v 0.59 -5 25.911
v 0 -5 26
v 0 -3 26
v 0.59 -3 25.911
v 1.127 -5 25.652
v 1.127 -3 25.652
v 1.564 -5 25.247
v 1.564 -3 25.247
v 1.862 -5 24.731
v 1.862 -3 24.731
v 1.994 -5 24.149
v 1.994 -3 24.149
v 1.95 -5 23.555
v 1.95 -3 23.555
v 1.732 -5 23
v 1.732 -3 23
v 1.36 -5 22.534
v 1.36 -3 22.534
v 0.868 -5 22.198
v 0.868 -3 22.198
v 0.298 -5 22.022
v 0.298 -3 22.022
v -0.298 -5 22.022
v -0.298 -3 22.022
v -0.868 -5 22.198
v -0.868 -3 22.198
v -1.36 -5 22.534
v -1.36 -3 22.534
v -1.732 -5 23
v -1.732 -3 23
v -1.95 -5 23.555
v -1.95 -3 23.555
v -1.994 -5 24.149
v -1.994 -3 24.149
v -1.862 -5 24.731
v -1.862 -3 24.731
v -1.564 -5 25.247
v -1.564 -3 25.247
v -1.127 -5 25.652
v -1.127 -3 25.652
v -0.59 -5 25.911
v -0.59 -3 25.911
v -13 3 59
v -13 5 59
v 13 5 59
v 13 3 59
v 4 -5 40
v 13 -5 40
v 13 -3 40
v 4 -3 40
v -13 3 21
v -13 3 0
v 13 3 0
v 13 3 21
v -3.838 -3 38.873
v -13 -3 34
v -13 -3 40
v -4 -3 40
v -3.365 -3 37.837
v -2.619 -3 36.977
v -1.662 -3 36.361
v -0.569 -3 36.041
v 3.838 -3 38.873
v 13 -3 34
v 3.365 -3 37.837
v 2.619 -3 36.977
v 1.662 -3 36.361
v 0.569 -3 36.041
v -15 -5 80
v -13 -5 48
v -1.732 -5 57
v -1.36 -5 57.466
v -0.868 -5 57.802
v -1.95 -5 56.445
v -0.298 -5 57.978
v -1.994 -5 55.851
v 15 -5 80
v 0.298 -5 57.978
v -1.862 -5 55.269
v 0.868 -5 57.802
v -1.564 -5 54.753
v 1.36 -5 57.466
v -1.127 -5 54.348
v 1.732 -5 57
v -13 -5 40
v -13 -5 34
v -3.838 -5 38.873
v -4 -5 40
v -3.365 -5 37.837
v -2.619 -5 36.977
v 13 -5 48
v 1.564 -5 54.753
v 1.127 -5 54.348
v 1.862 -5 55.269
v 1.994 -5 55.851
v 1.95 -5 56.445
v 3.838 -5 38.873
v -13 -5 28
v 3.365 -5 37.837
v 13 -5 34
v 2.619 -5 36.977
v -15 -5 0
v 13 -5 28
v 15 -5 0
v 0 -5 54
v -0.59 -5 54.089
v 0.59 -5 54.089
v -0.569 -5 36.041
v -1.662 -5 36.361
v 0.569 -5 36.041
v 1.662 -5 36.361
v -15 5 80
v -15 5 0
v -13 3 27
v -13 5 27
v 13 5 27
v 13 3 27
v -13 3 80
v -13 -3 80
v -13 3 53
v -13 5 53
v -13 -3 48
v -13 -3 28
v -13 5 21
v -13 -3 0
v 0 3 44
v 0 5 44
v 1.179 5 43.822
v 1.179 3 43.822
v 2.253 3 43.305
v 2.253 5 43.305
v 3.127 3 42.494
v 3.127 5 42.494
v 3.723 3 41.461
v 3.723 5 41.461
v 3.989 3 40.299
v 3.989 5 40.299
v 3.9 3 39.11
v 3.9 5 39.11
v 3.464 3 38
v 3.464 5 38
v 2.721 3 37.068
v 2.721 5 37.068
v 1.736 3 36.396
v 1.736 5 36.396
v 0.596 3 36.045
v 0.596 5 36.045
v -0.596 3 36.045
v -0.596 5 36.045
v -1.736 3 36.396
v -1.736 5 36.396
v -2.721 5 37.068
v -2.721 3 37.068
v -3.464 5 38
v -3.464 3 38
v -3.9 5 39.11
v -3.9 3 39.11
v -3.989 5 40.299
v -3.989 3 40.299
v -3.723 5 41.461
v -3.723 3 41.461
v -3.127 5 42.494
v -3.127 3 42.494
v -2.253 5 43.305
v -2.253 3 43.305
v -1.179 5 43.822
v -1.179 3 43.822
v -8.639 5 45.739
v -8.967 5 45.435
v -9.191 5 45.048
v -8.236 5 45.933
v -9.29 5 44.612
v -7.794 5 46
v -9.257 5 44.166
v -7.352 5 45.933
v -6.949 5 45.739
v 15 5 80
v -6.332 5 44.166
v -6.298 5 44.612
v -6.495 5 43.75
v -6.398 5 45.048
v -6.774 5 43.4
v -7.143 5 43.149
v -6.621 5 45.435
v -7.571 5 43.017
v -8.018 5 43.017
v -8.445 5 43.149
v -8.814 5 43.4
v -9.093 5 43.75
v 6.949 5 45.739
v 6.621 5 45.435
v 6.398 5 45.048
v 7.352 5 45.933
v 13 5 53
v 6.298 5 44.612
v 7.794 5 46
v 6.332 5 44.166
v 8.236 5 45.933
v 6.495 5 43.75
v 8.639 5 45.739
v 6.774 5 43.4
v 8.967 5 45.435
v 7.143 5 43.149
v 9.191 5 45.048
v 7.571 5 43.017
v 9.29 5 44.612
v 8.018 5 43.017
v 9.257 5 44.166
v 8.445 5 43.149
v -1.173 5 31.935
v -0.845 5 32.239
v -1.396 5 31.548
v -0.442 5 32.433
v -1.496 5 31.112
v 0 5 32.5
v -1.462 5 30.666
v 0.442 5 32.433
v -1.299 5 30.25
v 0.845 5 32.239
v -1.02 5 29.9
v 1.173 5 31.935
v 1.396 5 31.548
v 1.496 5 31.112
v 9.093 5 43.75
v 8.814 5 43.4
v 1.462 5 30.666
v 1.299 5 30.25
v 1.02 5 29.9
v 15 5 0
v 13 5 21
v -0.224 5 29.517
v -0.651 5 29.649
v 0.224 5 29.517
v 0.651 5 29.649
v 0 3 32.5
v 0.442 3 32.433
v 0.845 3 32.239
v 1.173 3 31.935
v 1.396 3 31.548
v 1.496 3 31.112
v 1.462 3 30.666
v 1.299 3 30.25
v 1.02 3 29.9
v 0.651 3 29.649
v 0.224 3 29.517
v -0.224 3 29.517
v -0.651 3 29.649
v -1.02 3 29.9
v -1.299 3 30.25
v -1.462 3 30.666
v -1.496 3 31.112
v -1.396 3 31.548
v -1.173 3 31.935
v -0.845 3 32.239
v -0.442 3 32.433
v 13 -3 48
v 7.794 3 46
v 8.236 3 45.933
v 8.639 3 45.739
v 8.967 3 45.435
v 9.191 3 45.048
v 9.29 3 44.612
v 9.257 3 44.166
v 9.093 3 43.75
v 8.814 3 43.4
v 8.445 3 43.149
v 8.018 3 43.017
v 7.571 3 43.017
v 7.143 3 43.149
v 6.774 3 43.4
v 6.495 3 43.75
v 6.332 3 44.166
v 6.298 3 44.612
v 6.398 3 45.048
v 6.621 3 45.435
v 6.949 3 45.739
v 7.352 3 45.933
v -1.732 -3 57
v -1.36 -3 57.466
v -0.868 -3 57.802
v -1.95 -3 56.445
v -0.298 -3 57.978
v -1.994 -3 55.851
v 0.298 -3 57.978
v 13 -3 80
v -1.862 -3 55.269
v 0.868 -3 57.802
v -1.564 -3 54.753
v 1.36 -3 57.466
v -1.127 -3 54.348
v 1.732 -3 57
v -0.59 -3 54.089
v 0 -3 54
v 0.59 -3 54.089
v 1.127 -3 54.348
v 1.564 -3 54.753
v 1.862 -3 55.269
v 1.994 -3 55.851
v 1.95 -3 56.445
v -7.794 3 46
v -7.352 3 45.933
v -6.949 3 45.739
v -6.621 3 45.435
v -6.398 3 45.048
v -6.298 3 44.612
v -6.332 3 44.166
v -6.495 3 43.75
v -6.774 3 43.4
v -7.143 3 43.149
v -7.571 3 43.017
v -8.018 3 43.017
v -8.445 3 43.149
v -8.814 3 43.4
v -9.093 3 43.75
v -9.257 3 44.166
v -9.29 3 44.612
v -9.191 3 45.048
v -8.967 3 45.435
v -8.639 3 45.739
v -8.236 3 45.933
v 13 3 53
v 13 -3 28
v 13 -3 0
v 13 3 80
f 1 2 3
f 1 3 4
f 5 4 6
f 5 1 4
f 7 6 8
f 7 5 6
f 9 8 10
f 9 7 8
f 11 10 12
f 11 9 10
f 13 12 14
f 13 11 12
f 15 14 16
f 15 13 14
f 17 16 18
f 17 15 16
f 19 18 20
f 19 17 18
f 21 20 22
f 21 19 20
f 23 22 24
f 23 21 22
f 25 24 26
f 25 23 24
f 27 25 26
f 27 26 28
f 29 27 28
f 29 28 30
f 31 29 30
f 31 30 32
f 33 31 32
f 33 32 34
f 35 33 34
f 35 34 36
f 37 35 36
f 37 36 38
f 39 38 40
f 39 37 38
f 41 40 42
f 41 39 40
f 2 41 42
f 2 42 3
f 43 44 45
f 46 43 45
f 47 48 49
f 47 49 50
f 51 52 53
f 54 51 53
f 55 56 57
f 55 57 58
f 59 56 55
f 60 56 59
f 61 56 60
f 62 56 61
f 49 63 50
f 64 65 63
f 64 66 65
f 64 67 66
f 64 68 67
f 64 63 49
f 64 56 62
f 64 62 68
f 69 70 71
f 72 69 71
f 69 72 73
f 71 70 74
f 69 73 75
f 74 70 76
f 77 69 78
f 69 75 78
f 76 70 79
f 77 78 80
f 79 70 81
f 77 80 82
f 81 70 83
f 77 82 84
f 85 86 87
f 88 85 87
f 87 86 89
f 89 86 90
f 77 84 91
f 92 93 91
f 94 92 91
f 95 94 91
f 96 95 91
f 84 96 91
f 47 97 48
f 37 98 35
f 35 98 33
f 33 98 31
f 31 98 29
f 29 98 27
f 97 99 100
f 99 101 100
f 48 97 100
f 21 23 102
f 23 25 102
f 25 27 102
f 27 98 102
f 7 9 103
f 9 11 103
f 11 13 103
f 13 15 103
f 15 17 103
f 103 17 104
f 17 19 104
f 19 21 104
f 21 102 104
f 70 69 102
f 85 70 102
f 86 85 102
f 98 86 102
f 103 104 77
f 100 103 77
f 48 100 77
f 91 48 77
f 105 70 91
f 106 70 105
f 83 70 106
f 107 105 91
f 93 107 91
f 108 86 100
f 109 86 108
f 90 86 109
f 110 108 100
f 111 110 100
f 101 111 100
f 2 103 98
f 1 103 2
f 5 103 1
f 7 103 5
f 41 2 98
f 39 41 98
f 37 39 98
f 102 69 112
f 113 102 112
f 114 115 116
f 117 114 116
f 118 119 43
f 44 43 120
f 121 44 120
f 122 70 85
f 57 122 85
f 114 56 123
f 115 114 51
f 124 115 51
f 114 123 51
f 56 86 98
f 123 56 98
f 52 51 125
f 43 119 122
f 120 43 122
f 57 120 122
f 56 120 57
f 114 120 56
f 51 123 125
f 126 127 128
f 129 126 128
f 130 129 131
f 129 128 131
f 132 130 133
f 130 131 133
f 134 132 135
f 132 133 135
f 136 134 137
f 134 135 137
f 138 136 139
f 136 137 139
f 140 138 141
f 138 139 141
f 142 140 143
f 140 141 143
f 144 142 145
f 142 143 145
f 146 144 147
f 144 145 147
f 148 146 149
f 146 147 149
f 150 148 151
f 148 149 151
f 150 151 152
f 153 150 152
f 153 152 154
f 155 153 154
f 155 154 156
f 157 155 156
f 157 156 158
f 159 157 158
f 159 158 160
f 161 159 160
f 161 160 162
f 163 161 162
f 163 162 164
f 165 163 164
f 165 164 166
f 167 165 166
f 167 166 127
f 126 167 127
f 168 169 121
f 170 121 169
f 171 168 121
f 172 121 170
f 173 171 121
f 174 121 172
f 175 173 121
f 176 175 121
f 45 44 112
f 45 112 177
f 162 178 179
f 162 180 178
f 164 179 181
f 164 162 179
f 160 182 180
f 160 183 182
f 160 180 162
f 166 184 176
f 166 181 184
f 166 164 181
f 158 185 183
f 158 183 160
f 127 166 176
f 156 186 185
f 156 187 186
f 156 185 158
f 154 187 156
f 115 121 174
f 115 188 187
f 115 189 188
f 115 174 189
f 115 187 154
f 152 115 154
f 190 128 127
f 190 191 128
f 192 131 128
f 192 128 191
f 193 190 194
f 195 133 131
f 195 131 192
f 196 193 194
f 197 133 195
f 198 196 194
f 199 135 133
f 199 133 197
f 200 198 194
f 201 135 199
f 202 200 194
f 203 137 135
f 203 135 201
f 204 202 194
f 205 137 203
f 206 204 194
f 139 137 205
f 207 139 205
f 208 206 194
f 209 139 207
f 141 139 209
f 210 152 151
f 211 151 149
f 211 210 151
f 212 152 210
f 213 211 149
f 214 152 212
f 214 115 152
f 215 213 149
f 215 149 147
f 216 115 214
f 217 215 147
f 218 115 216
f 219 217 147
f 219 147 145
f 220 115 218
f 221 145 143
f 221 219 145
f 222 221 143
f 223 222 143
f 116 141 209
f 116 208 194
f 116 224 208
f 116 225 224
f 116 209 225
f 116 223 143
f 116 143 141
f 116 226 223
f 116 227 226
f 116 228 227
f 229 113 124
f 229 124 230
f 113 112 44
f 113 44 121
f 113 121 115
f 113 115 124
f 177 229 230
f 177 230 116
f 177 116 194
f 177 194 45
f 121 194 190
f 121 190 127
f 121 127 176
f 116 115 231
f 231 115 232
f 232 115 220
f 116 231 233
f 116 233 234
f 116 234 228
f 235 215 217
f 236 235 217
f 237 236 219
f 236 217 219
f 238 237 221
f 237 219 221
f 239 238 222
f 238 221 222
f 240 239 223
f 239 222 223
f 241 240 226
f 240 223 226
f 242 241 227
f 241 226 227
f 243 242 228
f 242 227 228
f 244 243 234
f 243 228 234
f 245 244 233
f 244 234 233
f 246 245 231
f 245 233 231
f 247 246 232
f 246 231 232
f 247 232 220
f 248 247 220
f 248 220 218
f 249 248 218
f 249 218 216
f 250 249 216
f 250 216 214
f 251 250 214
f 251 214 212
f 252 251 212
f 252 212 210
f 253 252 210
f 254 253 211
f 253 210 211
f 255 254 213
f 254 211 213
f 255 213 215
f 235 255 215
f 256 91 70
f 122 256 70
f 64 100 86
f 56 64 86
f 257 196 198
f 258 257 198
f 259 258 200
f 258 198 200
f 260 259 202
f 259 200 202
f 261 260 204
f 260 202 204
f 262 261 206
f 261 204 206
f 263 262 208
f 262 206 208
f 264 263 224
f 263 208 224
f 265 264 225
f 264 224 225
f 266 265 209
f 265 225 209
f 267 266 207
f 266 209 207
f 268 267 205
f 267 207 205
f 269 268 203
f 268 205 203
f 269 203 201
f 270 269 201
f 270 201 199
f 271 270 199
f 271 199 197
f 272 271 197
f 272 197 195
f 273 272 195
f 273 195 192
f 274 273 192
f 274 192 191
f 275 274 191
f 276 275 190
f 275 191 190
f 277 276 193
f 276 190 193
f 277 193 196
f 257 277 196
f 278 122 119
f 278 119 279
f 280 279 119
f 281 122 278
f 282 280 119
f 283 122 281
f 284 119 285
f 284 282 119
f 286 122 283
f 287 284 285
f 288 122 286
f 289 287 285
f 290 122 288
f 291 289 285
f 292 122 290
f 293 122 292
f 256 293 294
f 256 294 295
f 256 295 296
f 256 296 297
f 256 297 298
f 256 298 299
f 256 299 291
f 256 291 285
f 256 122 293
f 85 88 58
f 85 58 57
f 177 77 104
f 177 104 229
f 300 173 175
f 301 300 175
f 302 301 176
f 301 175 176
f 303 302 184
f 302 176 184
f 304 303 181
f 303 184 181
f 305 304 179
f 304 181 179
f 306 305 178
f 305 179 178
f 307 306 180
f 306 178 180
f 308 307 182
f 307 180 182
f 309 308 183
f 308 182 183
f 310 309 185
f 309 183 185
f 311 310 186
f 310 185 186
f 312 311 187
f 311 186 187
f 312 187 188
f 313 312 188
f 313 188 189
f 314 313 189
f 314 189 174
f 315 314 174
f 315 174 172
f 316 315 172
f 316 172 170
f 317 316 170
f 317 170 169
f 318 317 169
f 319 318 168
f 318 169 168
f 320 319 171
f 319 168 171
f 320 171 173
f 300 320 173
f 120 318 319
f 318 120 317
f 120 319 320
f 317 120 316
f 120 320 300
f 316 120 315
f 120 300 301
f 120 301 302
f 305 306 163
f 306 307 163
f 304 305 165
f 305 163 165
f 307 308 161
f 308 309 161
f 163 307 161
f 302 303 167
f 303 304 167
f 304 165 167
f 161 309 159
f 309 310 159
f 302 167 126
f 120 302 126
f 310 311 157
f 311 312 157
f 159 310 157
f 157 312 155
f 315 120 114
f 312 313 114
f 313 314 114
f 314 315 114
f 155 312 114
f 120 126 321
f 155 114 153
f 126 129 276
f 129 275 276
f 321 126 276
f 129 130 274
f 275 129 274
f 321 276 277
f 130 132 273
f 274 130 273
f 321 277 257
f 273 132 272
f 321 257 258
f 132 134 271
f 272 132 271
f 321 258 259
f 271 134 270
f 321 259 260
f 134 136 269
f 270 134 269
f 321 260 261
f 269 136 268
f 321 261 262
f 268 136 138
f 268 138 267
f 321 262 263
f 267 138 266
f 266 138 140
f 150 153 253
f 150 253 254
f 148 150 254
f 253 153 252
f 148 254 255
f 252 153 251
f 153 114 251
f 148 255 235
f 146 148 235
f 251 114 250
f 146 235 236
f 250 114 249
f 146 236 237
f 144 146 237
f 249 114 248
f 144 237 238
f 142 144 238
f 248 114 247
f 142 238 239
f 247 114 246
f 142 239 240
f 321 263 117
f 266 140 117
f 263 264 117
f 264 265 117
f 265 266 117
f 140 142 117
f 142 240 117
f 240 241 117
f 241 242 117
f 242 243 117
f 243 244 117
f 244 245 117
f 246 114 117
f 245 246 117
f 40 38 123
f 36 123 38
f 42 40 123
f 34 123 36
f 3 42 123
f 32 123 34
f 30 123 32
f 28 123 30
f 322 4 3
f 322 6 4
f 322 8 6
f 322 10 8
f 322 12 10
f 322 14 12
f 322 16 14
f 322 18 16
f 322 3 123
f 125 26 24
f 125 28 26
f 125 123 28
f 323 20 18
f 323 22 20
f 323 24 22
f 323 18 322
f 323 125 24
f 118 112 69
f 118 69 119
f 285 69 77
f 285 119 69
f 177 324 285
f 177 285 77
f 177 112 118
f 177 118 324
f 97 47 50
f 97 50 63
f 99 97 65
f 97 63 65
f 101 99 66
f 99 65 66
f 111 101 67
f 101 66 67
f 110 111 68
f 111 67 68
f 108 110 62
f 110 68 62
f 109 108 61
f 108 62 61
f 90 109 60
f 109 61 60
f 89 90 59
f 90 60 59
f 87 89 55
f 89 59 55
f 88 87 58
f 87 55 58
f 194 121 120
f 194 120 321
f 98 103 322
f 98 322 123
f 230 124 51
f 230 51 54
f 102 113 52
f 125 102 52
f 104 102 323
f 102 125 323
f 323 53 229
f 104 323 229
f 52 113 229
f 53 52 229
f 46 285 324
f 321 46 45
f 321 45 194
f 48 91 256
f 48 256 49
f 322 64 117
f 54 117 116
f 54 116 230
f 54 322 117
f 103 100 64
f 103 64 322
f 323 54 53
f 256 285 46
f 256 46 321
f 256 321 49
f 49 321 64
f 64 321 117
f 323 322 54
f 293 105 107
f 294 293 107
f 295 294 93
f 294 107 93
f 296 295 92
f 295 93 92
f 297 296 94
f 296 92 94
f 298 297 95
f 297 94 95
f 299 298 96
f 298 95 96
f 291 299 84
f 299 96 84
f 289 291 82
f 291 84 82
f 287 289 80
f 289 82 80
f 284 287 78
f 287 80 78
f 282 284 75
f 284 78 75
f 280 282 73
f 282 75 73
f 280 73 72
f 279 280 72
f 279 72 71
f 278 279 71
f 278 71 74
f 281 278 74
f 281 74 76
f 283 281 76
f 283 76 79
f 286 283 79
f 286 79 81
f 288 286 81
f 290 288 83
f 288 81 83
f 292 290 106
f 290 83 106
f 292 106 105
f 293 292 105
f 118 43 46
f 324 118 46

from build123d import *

# Parameters (mm, degrees)
ESBO_O1_W                = 30
ESBO_O1_H                = 10
ESBO_O1_W_2              = 26
ESBO_O1_H_2              = 6
RESSALTO_EXTRUS_O1_DEPTH = 80
ESBO_O2_R                = 4
CORTE_EXTRUS_O1_DEPTH    = 10
ESBO_O4_R                = 1.5
CORTE_EXTRUS_O2_DEPTH    = 2
ESBO_O6_R                = 2
CORTE_EXTRUS_O4_DEPTH    = 2
ESBO_O7_W                = 26
ESBO_O7_H                = 6
CORTE_EXTRUS_O5_DEPTH    = 2
ESBO_O8_W                = 26
ESBO_O8_H                = 6
CORTE_EXTRUS_O6_DEPTH    = 2
ESBO_O10_W               = 26
ESBO_O10_H               = 8
CORTE_EXTRUS_O7_DEPTH    = 2


with BuildPart() as part:
    # Esboço1 → Ressalto-extrusão1 (new body)
    with BuildSketch(Plane.XY):
        Rectangle(ESBO_O1_W, ESBO_O1_H)
        Rectangle(ESBO_O1_W_2, ESBO_O1_H_2, mode=Mode.SUBTRACT)
    extrude(amount=RESSALTO_EXTRUS_O1_DEPTH)

    # Esboço2 → Corte-extrusão1 (cut)
    with BuildSketch(Plane(origin=(0, 5, 0), x_dir=(1, 0, 0), z_dir=(0, 1, 0))):
        with Locations(Location((0, -40, 0), (0, 0, 270))):
            Circle(ESBO_O2_R)
    extrude(amount=-CORTE_EXTRUS_O1_DEPTH, mode=Mode.SUBTRACT)

    # Esboço4 → Corte-extrusão2 (cut)
    with BuildSketch(Plane(origin=(0, 5, 0), x_dir=(1, 0, 0), z_dir=(0, 1, 0))):
        with Locations(Location((0, -31, 0), (0, 0, 270))):
            Circle(ESBO_O4_R)
        with Locations(Location((7.794228634, -44.5, 0), (0, 0, 270))):
            Circle(ESBO_O4_R)
        with Locations(Location((-7.794228634, -44.5, 0), (0, 0, 270))):
            Circle(ESBO_O4_R)
    extrude(amount=-CORTE_EXTRUS_O2_DEPTH, mode=Mode.SUBTRACT)

    # Esboço6 → Corte-extrusão4 (cut)
    with BuildSketch(Plane(origin=(0, -5, 0), x_dir=(-1, 0, 0), z_dir=(0, -1, 0))):
        with Locations(Location((0, -56, 0), (0, 0, 90))):
            Circle(ESBO_O6_R)
    corte_extrus_o4 = extrude(amount=-CORTE_EXTRUS_O4_DEPTH, mode=Mode.SUBTRACT)

    # Espelhar1: Corte-extrusão4 across plane
    add(corte_extrus_o4.mirror(Plane.XY.offset(40)), mode=Mode.SUBTRACT)

    # Esboço7 → Corte-extrusão5 (cut)
    with BuildSketch(Plane(origin=(0, 5, 0), x_dir=(1, 0, 0), z_dir=(0, 1, 0))):
        with Locations((0, -24)):
            Rectangle(ESBO_O7_W, ESBO_O7_H)
    corte_extrus_o5 = extrude(amount=-CORTE_EXTRUS_O5_DEPTH, mode=Mode.SUBTRACT)

    # Espelhar2: Corte-extrusão5 across plane
    add(corte_extrus_o5.mirror(Plane.XY.offset(40)), mode=Mode.SUBTRACT)

    # Esboço8 → Corte-extrusão6 (cut)
    with BuildSketch(Plane(origin=(0, -5, 0), x_dir=(-1, 0, 0), z_dir=(0, -1, 0))):
        with Locations((0, -31)):
            Rectangle(ESBO_O8_W, ESBO_O8_H)
    extrude(amount=-CORTE_EXTRUS_O6_DEPTH, mode=Mode.SUBTRACT)

    # Esboço10 → Corte-extrusão7 (cut)
    with BuildSketch(Plane(origin=(0, -5, 0), x_dir=(-1, 0, 0), z_dir=(0, -1, 0))):
        with Locations((0, -44)):
            Rectangle(ESBO_O10_W, ESBO_O10_H)
    extrude(amount=-CORTE_EXTRUS_O7_DEPTH, mode=Mode.SUBTRACT)


solid = part.part
